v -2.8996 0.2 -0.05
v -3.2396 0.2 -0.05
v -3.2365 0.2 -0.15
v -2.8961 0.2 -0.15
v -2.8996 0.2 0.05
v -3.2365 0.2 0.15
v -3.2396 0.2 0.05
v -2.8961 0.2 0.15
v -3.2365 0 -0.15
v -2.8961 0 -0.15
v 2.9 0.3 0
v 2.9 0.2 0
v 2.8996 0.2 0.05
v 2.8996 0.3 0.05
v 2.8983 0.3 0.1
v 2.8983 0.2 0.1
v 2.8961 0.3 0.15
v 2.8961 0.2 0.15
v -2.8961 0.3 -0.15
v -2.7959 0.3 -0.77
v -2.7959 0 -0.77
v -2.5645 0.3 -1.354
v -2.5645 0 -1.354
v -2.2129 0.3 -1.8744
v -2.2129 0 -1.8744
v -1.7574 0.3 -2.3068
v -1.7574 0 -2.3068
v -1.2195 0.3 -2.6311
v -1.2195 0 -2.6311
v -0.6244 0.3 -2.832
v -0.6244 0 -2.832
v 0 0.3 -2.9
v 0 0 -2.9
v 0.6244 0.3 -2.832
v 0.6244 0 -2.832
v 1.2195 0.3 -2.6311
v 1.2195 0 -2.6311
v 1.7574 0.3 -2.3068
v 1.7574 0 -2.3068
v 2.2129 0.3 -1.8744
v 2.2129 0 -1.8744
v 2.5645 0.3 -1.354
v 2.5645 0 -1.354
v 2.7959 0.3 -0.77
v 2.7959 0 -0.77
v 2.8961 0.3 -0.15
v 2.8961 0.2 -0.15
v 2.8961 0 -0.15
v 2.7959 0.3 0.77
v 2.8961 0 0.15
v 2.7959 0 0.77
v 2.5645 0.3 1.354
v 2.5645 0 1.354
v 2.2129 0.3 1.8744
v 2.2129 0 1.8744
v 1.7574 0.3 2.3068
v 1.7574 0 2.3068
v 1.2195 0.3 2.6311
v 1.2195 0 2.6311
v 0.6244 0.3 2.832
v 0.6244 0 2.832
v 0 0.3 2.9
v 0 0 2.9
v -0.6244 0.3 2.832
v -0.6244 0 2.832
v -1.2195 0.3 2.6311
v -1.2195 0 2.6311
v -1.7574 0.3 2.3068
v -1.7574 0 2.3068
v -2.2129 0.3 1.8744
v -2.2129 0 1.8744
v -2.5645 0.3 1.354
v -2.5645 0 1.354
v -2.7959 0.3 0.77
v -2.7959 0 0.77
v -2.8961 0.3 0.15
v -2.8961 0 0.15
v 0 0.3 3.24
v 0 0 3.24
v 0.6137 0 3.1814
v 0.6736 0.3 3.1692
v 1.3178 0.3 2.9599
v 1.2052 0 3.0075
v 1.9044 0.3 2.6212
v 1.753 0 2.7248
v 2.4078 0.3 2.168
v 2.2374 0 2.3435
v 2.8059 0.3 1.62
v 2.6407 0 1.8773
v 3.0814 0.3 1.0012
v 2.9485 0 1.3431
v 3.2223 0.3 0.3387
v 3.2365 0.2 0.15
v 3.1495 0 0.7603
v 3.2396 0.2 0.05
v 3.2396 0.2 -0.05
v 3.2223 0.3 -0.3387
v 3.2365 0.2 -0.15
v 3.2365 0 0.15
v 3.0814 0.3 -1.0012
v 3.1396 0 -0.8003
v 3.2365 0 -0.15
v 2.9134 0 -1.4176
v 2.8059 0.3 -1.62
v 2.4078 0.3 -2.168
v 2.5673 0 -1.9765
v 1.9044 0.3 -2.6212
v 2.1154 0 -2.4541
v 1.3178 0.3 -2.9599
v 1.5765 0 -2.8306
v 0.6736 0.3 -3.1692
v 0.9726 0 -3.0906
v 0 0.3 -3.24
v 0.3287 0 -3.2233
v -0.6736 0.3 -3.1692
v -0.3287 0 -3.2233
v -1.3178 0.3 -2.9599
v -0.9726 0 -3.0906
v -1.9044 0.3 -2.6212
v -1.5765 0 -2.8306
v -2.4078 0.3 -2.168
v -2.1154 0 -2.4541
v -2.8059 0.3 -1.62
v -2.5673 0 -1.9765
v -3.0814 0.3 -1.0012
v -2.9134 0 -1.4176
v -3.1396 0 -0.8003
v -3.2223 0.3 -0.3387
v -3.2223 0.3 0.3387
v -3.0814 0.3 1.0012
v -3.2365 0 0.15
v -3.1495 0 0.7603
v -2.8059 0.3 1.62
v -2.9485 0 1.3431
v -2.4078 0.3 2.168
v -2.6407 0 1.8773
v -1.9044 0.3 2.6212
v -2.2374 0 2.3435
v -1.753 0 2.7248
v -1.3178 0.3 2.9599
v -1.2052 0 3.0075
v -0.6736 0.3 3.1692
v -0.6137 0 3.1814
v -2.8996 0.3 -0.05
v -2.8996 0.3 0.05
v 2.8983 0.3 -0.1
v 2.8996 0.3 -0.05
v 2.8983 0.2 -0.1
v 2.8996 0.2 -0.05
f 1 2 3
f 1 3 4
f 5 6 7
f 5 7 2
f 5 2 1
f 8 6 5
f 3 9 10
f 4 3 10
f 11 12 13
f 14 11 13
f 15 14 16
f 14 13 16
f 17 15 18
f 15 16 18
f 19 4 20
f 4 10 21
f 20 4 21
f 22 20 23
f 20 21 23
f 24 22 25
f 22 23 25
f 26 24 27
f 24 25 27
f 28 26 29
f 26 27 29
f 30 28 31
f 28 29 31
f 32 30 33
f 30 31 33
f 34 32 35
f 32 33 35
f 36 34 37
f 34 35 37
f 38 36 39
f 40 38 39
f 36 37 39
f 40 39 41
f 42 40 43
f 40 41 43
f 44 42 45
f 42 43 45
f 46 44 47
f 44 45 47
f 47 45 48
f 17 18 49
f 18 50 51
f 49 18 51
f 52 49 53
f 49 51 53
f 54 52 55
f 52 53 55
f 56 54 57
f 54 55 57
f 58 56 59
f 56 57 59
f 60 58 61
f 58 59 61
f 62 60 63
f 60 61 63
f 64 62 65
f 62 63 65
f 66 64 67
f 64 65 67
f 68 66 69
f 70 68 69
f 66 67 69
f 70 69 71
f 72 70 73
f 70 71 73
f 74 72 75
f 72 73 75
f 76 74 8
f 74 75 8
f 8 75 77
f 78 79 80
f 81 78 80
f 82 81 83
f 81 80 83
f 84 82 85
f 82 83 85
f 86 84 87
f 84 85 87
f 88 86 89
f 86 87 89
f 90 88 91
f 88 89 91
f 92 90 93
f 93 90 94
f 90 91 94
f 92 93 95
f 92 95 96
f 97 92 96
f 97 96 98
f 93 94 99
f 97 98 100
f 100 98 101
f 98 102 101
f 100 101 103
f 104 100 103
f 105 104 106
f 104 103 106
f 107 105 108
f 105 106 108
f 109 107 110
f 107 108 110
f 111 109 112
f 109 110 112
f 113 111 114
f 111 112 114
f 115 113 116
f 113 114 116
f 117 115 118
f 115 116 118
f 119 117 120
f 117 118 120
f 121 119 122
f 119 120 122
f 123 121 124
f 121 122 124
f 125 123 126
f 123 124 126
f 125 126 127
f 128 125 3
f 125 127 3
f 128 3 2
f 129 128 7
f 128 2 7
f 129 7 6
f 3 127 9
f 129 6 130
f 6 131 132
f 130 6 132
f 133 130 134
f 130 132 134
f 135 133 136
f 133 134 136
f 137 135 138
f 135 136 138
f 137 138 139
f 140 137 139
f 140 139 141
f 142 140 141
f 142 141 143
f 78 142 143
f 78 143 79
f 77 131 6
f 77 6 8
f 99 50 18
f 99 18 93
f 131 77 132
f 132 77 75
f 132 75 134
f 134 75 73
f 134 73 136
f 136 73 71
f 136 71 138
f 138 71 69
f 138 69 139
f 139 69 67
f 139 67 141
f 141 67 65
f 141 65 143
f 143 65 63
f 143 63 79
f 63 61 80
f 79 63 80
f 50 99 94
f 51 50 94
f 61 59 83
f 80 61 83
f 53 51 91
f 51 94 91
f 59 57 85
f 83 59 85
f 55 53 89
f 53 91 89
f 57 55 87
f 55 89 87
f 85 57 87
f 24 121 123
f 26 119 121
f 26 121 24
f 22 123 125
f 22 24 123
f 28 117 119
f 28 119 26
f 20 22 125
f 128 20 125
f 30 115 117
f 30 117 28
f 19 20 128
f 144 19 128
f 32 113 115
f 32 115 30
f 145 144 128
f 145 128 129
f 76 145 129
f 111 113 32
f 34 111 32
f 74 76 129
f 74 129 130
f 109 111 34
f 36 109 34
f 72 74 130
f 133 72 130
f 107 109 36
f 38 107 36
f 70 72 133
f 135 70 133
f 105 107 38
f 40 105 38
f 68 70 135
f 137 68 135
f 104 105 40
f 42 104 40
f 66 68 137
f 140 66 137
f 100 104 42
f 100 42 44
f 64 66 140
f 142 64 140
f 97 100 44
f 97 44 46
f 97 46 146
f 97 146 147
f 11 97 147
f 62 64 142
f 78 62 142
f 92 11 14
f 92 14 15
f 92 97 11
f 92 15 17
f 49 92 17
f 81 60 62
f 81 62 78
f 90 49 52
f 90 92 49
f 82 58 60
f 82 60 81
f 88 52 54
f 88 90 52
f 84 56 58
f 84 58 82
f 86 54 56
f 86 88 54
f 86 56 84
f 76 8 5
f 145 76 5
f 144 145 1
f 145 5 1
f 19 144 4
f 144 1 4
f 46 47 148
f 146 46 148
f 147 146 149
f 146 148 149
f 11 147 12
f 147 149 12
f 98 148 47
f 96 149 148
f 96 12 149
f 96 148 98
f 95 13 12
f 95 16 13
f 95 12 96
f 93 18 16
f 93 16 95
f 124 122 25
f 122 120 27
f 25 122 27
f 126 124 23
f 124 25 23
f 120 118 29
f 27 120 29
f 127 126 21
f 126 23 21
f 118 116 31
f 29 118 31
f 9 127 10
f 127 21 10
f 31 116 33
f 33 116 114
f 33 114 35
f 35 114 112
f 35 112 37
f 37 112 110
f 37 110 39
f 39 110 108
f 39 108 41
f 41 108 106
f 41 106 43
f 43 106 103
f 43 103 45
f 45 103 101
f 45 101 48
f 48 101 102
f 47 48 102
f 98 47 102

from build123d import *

# Parameters (mm, degrees)
SKETCH_2_R          = 3.24
EXTRUDE_2_DEPTH     = 0.3
CUT_EXTRUDE_1_DEPTH = 0.6
SKETCH_4_W          = 7.550166352
SKETCH_4_H          = 0.3
CUT_EXTRUDE_2_DEPTH = 0.2


with BuildPart() as part:
    # Эскиз2 → Бобышка-Вытянуть2 (new body)
    with BuildSketch(Plane(origin=(0, 0, 0), x_dir=(1, 0, 0), z_dir=(0, 1, 0))):
        with Locations(Location((0, 0, 0), (0, 0, 270))):
            Circle(SKETCH_2_R)
    extrude(amount=EXTRUDE_2_DEPTH)

    # Эскиз3 → Вырез-Вытянуть1 (cut)
    with BuildSketch(Plane.XZ):
        with BuildLine():
            Line((-2.896118092, 0.15), (2.896118092, 0.15))
            ThreePointArc((2.896118092, 0.15), (0, 2.9), (-2.896118092, 0.15))
        make_face()
        with BuildLine():
            Line((-2.896118092, -0.15), (2.896118092, -0.15))
            ThreePointArc((2.896118092, -0.15), (2.89902936, -0.075025111), (2.9, 0))
            ThreePointArc((2.9, 0), (2.89902936, 0.075025111), (2.896118092, 0.15))
            Line((2.896118092, 0.15), (-2.896118092, 0.15))
            ThreePointArc((-2.896118092, 0.15), (-2.9, 0), (-2.896118092, -0.15))
        make_face()
        with BuildLine():
            ThreePointArc((-2.896118092, -0.15), (0, -2.9), (2.896118092, -0.15))
            Line((2.896118092, -0.15), (-2.896118092, -0.15))
        make_face()
    extrude(amount=-CUT_EXTRUDE_1_DEPTH, mode=Mode.SUBTRACT)

    # Эскиз4 → Вырез-Вытянуть2 (cut)
    with BuildSketch(Plane.XZ):
        Rectangle(SKETCH_4_W, SKETCH_4_H)
    extrude(amount=-CUT_EXTRUDE_2_DEPTH, mode=Mode.SUBTRACT)


solid = part.part
